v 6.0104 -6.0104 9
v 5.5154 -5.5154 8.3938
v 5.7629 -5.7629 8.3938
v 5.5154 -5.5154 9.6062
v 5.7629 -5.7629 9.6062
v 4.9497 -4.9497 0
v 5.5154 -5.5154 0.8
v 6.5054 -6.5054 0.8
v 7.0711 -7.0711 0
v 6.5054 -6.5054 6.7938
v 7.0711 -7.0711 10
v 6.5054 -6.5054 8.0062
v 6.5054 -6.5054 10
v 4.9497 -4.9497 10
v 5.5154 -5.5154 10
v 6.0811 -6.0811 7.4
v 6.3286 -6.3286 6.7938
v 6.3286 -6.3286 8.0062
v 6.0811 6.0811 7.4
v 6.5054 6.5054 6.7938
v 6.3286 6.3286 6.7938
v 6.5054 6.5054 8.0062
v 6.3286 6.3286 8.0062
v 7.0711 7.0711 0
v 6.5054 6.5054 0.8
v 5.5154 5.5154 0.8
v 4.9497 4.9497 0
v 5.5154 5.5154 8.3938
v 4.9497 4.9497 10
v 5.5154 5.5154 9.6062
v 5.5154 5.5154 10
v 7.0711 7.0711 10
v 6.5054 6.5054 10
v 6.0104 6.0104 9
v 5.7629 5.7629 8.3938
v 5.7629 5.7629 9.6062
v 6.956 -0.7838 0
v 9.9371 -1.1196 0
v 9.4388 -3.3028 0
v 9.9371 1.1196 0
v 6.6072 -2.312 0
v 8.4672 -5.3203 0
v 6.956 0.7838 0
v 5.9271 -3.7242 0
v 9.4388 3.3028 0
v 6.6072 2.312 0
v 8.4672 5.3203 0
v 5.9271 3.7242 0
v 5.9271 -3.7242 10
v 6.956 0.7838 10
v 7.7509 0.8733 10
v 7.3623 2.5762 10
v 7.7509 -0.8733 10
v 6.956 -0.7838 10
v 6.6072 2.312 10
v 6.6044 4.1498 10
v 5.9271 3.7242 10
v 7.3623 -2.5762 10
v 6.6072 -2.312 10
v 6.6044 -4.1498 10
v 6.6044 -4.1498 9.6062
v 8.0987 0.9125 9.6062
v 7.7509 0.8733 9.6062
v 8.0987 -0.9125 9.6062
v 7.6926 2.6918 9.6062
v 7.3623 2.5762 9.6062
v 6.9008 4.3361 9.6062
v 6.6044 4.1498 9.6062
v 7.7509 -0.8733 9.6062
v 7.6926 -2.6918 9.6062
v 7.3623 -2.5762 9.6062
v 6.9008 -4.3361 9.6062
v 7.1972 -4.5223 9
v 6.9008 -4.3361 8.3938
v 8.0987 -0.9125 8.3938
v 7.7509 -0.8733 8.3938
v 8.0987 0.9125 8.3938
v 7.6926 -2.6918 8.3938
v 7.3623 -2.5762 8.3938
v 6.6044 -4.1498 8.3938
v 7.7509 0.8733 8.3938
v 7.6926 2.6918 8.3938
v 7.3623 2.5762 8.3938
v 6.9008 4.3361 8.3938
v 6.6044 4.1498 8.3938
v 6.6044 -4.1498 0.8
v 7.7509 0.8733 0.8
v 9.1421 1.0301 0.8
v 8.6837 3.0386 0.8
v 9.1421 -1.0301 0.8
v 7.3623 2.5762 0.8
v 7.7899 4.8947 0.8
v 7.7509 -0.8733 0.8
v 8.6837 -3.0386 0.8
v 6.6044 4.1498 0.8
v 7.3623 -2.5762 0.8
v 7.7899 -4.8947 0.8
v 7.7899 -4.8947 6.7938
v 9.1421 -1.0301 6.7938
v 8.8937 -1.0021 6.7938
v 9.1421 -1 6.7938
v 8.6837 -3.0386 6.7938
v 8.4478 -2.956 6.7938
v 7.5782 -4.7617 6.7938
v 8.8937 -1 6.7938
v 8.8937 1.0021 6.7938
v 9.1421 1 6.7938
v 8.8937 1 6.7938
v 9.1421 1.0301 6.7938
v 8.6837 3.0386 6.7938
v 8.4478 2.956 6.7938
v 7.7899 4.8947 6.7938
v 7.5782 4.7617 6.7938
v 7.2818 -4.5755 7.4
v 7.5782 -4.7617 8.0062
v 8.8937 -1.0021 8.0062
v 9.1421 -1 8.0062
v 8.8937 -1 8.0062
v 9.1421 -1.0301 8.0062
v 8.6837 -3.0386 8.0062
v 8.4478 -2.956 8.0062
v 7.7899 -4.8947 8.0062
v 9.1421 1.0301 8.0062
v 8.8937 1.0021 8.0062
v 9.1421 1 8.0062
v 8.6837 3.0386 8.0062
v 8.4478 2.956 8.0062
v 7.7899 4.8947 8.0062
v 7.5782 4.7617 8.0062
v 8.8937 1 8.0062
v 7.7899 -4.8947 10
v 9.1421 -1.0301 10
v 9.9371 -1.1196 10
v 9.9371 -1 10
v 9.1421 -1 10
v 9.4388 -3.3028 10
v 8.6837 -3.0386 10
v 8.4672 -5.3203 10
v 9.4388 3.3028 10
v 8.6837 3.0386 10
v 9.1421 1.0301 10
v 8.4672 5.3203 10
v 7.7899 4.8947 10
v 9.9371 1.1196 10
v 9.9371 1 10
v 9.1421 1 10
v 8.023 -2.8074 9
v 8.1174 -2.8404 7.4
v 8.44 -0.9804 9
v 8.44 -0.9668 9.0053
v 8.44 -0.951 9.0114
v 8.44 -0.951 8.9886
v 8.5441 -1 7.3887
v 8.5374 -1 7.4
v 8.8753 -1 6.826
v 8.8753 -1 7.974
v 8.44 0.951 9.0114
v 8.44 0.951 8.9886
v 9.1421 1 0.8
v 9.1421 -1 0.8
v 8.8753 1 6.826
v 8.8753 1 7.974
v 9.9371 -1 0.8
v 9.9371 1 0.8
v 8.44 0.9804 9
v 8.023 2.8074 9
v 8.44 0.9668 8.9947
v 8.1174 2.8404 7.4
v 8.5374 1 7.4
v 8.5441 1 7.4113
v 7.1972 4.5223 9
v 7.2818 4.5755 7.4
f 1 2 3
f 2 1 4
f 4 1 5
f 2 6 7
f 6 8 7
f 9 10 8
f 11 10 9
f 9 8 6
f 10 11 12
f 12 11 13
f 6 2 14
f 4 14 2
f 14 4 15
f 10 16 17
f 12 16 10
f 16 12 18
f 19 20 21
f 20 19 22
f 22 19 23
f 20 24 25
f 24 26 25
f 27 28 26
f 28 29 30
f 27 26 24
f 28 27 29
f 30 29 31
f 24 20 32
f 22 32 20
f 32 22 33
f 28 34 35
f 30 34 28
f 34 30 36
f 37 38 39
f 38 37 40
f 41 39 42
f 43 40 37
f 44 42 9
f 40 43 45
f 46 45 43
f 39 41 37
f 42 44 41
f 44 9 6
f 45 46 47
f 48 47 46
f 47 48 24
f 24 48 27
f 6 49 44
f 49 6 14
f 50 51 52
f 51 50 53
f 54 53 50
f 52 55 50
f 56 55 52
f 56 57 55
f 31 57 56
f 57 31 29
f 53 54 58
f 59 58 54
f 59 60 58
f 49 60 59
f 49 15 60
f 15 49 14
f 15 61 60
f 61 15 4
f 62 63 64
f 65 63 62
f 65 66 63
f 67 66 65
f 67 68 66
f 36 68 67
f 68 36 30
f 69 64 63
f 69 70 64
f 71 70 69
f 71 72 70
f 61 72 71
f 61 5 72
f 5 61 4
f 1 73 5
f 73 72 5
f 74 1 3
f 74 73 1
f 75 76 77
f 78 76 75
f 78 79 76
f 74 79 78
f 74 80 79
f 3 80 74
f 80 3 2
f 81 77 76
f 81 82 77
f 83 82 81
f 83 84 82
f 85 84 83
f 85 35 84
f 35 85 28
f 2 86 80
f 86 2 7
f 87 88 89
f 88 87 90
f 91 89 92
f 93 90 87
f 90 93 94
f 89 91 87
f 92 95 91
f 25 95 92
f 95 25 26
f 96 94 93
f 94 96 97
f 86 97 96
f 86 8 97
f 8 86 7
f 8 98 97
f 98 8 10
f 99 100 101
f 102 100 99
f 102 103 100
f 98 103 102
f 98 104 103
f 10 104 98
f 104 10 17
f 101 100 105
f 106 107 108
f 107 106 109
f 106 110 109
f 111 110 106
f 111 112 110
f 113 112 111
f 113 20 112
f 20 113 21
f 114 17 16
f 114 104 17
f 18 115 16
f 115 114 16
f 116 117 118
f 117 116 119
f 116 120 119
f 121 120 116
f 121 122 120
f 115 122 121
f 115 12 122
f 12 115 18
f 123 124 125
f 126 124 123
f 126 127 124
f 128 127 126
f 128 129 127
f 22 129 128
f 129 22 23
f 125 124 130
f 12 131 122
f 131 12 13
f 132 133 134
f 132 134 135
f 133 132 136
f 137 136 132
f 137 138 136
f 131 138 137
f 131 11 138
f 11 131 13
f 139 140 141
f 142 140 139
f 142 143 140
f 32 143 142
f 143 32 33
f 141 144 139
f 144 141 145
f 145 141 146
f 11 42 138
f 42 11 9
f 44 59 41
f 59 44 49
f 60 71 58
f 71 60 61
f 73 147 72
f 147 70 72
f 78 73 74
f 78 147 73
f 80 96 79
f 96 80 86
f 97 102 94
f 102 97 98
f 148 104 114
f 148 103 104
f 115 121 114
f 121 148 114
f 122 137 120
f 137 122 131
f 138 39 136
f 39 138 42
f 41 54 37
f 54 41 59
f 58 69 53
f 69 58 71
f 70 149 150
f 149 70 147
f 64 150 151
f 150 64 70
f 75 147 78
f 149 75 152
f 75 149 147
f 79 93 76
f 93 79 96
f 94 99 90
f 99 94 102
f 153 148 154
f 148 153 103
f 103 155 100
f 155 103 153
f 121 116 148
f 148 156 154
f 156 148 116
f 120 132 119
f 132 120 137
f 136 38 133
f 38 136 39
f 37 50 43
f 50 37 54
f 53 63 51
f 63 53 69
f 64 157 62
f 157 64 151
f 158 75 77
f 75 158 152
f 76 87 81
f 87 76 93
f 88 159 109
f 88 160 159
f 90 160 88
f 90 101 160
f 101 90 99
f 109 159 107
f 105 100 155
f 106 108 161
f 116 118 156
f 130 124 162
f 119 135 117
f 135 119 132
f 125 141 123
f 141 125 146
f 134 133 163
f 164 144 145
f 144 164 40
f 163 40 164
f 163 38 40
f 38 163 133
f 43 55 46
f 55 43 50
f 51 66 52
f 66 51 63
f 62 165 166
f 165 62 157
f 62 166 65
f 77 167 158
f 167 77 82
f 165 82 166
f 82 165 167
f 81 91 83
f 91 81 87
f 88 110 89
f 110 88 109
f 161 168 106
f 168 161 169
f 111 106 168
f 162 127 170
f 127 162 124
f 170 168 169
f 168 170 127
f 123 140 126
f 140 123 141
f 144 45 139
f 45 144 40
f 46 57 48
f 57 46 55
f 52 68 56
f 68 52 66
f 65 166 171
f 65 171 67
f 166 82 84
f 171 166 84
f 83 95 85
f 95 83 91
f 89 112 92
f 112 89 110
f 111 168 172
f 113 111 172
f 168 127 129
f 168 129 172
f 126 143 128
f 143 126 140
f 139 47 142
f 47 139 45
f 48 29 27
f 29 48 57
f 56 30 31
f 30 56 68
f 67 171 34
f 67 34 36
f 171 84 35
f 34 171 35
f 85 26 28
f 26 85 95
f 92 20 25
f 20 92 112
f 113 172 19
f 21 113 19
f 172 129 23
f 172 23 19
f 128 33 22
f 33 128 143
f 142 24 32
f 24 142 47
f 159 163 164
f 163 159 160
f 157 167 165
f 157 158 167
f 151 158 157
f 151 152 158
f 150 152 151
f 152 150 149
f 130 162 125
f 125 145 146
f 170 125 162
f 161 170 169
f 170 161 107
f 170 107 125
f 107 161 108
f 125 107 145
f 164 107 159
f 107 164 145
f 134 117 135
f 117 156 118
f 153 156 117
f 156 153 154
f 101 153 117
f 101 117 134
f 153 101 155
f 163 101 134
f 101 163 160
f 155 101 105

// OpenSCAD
thick = 0.8;
mask_thick = 0.7;


difference(){
    rotate([0,0,-45])
    rotate_extrude(angle = 90)
    translate([7,0,0]){
    $fn = 6;
    difference(){
        square([thick*2+mask_thick*2, 10]);
        translate([thick,thick,0])
        square([mask_thick*2, 10]);
    }

    translate([thick*2+mask_thick,thick*3+5,0])
    circle(mask_thick);

    translate([thick,thick*5+5,0])
    circle(mask_thick);
    }
translate([7+thick*1.8,-1,thick])
cube([10,2,10]);
}
